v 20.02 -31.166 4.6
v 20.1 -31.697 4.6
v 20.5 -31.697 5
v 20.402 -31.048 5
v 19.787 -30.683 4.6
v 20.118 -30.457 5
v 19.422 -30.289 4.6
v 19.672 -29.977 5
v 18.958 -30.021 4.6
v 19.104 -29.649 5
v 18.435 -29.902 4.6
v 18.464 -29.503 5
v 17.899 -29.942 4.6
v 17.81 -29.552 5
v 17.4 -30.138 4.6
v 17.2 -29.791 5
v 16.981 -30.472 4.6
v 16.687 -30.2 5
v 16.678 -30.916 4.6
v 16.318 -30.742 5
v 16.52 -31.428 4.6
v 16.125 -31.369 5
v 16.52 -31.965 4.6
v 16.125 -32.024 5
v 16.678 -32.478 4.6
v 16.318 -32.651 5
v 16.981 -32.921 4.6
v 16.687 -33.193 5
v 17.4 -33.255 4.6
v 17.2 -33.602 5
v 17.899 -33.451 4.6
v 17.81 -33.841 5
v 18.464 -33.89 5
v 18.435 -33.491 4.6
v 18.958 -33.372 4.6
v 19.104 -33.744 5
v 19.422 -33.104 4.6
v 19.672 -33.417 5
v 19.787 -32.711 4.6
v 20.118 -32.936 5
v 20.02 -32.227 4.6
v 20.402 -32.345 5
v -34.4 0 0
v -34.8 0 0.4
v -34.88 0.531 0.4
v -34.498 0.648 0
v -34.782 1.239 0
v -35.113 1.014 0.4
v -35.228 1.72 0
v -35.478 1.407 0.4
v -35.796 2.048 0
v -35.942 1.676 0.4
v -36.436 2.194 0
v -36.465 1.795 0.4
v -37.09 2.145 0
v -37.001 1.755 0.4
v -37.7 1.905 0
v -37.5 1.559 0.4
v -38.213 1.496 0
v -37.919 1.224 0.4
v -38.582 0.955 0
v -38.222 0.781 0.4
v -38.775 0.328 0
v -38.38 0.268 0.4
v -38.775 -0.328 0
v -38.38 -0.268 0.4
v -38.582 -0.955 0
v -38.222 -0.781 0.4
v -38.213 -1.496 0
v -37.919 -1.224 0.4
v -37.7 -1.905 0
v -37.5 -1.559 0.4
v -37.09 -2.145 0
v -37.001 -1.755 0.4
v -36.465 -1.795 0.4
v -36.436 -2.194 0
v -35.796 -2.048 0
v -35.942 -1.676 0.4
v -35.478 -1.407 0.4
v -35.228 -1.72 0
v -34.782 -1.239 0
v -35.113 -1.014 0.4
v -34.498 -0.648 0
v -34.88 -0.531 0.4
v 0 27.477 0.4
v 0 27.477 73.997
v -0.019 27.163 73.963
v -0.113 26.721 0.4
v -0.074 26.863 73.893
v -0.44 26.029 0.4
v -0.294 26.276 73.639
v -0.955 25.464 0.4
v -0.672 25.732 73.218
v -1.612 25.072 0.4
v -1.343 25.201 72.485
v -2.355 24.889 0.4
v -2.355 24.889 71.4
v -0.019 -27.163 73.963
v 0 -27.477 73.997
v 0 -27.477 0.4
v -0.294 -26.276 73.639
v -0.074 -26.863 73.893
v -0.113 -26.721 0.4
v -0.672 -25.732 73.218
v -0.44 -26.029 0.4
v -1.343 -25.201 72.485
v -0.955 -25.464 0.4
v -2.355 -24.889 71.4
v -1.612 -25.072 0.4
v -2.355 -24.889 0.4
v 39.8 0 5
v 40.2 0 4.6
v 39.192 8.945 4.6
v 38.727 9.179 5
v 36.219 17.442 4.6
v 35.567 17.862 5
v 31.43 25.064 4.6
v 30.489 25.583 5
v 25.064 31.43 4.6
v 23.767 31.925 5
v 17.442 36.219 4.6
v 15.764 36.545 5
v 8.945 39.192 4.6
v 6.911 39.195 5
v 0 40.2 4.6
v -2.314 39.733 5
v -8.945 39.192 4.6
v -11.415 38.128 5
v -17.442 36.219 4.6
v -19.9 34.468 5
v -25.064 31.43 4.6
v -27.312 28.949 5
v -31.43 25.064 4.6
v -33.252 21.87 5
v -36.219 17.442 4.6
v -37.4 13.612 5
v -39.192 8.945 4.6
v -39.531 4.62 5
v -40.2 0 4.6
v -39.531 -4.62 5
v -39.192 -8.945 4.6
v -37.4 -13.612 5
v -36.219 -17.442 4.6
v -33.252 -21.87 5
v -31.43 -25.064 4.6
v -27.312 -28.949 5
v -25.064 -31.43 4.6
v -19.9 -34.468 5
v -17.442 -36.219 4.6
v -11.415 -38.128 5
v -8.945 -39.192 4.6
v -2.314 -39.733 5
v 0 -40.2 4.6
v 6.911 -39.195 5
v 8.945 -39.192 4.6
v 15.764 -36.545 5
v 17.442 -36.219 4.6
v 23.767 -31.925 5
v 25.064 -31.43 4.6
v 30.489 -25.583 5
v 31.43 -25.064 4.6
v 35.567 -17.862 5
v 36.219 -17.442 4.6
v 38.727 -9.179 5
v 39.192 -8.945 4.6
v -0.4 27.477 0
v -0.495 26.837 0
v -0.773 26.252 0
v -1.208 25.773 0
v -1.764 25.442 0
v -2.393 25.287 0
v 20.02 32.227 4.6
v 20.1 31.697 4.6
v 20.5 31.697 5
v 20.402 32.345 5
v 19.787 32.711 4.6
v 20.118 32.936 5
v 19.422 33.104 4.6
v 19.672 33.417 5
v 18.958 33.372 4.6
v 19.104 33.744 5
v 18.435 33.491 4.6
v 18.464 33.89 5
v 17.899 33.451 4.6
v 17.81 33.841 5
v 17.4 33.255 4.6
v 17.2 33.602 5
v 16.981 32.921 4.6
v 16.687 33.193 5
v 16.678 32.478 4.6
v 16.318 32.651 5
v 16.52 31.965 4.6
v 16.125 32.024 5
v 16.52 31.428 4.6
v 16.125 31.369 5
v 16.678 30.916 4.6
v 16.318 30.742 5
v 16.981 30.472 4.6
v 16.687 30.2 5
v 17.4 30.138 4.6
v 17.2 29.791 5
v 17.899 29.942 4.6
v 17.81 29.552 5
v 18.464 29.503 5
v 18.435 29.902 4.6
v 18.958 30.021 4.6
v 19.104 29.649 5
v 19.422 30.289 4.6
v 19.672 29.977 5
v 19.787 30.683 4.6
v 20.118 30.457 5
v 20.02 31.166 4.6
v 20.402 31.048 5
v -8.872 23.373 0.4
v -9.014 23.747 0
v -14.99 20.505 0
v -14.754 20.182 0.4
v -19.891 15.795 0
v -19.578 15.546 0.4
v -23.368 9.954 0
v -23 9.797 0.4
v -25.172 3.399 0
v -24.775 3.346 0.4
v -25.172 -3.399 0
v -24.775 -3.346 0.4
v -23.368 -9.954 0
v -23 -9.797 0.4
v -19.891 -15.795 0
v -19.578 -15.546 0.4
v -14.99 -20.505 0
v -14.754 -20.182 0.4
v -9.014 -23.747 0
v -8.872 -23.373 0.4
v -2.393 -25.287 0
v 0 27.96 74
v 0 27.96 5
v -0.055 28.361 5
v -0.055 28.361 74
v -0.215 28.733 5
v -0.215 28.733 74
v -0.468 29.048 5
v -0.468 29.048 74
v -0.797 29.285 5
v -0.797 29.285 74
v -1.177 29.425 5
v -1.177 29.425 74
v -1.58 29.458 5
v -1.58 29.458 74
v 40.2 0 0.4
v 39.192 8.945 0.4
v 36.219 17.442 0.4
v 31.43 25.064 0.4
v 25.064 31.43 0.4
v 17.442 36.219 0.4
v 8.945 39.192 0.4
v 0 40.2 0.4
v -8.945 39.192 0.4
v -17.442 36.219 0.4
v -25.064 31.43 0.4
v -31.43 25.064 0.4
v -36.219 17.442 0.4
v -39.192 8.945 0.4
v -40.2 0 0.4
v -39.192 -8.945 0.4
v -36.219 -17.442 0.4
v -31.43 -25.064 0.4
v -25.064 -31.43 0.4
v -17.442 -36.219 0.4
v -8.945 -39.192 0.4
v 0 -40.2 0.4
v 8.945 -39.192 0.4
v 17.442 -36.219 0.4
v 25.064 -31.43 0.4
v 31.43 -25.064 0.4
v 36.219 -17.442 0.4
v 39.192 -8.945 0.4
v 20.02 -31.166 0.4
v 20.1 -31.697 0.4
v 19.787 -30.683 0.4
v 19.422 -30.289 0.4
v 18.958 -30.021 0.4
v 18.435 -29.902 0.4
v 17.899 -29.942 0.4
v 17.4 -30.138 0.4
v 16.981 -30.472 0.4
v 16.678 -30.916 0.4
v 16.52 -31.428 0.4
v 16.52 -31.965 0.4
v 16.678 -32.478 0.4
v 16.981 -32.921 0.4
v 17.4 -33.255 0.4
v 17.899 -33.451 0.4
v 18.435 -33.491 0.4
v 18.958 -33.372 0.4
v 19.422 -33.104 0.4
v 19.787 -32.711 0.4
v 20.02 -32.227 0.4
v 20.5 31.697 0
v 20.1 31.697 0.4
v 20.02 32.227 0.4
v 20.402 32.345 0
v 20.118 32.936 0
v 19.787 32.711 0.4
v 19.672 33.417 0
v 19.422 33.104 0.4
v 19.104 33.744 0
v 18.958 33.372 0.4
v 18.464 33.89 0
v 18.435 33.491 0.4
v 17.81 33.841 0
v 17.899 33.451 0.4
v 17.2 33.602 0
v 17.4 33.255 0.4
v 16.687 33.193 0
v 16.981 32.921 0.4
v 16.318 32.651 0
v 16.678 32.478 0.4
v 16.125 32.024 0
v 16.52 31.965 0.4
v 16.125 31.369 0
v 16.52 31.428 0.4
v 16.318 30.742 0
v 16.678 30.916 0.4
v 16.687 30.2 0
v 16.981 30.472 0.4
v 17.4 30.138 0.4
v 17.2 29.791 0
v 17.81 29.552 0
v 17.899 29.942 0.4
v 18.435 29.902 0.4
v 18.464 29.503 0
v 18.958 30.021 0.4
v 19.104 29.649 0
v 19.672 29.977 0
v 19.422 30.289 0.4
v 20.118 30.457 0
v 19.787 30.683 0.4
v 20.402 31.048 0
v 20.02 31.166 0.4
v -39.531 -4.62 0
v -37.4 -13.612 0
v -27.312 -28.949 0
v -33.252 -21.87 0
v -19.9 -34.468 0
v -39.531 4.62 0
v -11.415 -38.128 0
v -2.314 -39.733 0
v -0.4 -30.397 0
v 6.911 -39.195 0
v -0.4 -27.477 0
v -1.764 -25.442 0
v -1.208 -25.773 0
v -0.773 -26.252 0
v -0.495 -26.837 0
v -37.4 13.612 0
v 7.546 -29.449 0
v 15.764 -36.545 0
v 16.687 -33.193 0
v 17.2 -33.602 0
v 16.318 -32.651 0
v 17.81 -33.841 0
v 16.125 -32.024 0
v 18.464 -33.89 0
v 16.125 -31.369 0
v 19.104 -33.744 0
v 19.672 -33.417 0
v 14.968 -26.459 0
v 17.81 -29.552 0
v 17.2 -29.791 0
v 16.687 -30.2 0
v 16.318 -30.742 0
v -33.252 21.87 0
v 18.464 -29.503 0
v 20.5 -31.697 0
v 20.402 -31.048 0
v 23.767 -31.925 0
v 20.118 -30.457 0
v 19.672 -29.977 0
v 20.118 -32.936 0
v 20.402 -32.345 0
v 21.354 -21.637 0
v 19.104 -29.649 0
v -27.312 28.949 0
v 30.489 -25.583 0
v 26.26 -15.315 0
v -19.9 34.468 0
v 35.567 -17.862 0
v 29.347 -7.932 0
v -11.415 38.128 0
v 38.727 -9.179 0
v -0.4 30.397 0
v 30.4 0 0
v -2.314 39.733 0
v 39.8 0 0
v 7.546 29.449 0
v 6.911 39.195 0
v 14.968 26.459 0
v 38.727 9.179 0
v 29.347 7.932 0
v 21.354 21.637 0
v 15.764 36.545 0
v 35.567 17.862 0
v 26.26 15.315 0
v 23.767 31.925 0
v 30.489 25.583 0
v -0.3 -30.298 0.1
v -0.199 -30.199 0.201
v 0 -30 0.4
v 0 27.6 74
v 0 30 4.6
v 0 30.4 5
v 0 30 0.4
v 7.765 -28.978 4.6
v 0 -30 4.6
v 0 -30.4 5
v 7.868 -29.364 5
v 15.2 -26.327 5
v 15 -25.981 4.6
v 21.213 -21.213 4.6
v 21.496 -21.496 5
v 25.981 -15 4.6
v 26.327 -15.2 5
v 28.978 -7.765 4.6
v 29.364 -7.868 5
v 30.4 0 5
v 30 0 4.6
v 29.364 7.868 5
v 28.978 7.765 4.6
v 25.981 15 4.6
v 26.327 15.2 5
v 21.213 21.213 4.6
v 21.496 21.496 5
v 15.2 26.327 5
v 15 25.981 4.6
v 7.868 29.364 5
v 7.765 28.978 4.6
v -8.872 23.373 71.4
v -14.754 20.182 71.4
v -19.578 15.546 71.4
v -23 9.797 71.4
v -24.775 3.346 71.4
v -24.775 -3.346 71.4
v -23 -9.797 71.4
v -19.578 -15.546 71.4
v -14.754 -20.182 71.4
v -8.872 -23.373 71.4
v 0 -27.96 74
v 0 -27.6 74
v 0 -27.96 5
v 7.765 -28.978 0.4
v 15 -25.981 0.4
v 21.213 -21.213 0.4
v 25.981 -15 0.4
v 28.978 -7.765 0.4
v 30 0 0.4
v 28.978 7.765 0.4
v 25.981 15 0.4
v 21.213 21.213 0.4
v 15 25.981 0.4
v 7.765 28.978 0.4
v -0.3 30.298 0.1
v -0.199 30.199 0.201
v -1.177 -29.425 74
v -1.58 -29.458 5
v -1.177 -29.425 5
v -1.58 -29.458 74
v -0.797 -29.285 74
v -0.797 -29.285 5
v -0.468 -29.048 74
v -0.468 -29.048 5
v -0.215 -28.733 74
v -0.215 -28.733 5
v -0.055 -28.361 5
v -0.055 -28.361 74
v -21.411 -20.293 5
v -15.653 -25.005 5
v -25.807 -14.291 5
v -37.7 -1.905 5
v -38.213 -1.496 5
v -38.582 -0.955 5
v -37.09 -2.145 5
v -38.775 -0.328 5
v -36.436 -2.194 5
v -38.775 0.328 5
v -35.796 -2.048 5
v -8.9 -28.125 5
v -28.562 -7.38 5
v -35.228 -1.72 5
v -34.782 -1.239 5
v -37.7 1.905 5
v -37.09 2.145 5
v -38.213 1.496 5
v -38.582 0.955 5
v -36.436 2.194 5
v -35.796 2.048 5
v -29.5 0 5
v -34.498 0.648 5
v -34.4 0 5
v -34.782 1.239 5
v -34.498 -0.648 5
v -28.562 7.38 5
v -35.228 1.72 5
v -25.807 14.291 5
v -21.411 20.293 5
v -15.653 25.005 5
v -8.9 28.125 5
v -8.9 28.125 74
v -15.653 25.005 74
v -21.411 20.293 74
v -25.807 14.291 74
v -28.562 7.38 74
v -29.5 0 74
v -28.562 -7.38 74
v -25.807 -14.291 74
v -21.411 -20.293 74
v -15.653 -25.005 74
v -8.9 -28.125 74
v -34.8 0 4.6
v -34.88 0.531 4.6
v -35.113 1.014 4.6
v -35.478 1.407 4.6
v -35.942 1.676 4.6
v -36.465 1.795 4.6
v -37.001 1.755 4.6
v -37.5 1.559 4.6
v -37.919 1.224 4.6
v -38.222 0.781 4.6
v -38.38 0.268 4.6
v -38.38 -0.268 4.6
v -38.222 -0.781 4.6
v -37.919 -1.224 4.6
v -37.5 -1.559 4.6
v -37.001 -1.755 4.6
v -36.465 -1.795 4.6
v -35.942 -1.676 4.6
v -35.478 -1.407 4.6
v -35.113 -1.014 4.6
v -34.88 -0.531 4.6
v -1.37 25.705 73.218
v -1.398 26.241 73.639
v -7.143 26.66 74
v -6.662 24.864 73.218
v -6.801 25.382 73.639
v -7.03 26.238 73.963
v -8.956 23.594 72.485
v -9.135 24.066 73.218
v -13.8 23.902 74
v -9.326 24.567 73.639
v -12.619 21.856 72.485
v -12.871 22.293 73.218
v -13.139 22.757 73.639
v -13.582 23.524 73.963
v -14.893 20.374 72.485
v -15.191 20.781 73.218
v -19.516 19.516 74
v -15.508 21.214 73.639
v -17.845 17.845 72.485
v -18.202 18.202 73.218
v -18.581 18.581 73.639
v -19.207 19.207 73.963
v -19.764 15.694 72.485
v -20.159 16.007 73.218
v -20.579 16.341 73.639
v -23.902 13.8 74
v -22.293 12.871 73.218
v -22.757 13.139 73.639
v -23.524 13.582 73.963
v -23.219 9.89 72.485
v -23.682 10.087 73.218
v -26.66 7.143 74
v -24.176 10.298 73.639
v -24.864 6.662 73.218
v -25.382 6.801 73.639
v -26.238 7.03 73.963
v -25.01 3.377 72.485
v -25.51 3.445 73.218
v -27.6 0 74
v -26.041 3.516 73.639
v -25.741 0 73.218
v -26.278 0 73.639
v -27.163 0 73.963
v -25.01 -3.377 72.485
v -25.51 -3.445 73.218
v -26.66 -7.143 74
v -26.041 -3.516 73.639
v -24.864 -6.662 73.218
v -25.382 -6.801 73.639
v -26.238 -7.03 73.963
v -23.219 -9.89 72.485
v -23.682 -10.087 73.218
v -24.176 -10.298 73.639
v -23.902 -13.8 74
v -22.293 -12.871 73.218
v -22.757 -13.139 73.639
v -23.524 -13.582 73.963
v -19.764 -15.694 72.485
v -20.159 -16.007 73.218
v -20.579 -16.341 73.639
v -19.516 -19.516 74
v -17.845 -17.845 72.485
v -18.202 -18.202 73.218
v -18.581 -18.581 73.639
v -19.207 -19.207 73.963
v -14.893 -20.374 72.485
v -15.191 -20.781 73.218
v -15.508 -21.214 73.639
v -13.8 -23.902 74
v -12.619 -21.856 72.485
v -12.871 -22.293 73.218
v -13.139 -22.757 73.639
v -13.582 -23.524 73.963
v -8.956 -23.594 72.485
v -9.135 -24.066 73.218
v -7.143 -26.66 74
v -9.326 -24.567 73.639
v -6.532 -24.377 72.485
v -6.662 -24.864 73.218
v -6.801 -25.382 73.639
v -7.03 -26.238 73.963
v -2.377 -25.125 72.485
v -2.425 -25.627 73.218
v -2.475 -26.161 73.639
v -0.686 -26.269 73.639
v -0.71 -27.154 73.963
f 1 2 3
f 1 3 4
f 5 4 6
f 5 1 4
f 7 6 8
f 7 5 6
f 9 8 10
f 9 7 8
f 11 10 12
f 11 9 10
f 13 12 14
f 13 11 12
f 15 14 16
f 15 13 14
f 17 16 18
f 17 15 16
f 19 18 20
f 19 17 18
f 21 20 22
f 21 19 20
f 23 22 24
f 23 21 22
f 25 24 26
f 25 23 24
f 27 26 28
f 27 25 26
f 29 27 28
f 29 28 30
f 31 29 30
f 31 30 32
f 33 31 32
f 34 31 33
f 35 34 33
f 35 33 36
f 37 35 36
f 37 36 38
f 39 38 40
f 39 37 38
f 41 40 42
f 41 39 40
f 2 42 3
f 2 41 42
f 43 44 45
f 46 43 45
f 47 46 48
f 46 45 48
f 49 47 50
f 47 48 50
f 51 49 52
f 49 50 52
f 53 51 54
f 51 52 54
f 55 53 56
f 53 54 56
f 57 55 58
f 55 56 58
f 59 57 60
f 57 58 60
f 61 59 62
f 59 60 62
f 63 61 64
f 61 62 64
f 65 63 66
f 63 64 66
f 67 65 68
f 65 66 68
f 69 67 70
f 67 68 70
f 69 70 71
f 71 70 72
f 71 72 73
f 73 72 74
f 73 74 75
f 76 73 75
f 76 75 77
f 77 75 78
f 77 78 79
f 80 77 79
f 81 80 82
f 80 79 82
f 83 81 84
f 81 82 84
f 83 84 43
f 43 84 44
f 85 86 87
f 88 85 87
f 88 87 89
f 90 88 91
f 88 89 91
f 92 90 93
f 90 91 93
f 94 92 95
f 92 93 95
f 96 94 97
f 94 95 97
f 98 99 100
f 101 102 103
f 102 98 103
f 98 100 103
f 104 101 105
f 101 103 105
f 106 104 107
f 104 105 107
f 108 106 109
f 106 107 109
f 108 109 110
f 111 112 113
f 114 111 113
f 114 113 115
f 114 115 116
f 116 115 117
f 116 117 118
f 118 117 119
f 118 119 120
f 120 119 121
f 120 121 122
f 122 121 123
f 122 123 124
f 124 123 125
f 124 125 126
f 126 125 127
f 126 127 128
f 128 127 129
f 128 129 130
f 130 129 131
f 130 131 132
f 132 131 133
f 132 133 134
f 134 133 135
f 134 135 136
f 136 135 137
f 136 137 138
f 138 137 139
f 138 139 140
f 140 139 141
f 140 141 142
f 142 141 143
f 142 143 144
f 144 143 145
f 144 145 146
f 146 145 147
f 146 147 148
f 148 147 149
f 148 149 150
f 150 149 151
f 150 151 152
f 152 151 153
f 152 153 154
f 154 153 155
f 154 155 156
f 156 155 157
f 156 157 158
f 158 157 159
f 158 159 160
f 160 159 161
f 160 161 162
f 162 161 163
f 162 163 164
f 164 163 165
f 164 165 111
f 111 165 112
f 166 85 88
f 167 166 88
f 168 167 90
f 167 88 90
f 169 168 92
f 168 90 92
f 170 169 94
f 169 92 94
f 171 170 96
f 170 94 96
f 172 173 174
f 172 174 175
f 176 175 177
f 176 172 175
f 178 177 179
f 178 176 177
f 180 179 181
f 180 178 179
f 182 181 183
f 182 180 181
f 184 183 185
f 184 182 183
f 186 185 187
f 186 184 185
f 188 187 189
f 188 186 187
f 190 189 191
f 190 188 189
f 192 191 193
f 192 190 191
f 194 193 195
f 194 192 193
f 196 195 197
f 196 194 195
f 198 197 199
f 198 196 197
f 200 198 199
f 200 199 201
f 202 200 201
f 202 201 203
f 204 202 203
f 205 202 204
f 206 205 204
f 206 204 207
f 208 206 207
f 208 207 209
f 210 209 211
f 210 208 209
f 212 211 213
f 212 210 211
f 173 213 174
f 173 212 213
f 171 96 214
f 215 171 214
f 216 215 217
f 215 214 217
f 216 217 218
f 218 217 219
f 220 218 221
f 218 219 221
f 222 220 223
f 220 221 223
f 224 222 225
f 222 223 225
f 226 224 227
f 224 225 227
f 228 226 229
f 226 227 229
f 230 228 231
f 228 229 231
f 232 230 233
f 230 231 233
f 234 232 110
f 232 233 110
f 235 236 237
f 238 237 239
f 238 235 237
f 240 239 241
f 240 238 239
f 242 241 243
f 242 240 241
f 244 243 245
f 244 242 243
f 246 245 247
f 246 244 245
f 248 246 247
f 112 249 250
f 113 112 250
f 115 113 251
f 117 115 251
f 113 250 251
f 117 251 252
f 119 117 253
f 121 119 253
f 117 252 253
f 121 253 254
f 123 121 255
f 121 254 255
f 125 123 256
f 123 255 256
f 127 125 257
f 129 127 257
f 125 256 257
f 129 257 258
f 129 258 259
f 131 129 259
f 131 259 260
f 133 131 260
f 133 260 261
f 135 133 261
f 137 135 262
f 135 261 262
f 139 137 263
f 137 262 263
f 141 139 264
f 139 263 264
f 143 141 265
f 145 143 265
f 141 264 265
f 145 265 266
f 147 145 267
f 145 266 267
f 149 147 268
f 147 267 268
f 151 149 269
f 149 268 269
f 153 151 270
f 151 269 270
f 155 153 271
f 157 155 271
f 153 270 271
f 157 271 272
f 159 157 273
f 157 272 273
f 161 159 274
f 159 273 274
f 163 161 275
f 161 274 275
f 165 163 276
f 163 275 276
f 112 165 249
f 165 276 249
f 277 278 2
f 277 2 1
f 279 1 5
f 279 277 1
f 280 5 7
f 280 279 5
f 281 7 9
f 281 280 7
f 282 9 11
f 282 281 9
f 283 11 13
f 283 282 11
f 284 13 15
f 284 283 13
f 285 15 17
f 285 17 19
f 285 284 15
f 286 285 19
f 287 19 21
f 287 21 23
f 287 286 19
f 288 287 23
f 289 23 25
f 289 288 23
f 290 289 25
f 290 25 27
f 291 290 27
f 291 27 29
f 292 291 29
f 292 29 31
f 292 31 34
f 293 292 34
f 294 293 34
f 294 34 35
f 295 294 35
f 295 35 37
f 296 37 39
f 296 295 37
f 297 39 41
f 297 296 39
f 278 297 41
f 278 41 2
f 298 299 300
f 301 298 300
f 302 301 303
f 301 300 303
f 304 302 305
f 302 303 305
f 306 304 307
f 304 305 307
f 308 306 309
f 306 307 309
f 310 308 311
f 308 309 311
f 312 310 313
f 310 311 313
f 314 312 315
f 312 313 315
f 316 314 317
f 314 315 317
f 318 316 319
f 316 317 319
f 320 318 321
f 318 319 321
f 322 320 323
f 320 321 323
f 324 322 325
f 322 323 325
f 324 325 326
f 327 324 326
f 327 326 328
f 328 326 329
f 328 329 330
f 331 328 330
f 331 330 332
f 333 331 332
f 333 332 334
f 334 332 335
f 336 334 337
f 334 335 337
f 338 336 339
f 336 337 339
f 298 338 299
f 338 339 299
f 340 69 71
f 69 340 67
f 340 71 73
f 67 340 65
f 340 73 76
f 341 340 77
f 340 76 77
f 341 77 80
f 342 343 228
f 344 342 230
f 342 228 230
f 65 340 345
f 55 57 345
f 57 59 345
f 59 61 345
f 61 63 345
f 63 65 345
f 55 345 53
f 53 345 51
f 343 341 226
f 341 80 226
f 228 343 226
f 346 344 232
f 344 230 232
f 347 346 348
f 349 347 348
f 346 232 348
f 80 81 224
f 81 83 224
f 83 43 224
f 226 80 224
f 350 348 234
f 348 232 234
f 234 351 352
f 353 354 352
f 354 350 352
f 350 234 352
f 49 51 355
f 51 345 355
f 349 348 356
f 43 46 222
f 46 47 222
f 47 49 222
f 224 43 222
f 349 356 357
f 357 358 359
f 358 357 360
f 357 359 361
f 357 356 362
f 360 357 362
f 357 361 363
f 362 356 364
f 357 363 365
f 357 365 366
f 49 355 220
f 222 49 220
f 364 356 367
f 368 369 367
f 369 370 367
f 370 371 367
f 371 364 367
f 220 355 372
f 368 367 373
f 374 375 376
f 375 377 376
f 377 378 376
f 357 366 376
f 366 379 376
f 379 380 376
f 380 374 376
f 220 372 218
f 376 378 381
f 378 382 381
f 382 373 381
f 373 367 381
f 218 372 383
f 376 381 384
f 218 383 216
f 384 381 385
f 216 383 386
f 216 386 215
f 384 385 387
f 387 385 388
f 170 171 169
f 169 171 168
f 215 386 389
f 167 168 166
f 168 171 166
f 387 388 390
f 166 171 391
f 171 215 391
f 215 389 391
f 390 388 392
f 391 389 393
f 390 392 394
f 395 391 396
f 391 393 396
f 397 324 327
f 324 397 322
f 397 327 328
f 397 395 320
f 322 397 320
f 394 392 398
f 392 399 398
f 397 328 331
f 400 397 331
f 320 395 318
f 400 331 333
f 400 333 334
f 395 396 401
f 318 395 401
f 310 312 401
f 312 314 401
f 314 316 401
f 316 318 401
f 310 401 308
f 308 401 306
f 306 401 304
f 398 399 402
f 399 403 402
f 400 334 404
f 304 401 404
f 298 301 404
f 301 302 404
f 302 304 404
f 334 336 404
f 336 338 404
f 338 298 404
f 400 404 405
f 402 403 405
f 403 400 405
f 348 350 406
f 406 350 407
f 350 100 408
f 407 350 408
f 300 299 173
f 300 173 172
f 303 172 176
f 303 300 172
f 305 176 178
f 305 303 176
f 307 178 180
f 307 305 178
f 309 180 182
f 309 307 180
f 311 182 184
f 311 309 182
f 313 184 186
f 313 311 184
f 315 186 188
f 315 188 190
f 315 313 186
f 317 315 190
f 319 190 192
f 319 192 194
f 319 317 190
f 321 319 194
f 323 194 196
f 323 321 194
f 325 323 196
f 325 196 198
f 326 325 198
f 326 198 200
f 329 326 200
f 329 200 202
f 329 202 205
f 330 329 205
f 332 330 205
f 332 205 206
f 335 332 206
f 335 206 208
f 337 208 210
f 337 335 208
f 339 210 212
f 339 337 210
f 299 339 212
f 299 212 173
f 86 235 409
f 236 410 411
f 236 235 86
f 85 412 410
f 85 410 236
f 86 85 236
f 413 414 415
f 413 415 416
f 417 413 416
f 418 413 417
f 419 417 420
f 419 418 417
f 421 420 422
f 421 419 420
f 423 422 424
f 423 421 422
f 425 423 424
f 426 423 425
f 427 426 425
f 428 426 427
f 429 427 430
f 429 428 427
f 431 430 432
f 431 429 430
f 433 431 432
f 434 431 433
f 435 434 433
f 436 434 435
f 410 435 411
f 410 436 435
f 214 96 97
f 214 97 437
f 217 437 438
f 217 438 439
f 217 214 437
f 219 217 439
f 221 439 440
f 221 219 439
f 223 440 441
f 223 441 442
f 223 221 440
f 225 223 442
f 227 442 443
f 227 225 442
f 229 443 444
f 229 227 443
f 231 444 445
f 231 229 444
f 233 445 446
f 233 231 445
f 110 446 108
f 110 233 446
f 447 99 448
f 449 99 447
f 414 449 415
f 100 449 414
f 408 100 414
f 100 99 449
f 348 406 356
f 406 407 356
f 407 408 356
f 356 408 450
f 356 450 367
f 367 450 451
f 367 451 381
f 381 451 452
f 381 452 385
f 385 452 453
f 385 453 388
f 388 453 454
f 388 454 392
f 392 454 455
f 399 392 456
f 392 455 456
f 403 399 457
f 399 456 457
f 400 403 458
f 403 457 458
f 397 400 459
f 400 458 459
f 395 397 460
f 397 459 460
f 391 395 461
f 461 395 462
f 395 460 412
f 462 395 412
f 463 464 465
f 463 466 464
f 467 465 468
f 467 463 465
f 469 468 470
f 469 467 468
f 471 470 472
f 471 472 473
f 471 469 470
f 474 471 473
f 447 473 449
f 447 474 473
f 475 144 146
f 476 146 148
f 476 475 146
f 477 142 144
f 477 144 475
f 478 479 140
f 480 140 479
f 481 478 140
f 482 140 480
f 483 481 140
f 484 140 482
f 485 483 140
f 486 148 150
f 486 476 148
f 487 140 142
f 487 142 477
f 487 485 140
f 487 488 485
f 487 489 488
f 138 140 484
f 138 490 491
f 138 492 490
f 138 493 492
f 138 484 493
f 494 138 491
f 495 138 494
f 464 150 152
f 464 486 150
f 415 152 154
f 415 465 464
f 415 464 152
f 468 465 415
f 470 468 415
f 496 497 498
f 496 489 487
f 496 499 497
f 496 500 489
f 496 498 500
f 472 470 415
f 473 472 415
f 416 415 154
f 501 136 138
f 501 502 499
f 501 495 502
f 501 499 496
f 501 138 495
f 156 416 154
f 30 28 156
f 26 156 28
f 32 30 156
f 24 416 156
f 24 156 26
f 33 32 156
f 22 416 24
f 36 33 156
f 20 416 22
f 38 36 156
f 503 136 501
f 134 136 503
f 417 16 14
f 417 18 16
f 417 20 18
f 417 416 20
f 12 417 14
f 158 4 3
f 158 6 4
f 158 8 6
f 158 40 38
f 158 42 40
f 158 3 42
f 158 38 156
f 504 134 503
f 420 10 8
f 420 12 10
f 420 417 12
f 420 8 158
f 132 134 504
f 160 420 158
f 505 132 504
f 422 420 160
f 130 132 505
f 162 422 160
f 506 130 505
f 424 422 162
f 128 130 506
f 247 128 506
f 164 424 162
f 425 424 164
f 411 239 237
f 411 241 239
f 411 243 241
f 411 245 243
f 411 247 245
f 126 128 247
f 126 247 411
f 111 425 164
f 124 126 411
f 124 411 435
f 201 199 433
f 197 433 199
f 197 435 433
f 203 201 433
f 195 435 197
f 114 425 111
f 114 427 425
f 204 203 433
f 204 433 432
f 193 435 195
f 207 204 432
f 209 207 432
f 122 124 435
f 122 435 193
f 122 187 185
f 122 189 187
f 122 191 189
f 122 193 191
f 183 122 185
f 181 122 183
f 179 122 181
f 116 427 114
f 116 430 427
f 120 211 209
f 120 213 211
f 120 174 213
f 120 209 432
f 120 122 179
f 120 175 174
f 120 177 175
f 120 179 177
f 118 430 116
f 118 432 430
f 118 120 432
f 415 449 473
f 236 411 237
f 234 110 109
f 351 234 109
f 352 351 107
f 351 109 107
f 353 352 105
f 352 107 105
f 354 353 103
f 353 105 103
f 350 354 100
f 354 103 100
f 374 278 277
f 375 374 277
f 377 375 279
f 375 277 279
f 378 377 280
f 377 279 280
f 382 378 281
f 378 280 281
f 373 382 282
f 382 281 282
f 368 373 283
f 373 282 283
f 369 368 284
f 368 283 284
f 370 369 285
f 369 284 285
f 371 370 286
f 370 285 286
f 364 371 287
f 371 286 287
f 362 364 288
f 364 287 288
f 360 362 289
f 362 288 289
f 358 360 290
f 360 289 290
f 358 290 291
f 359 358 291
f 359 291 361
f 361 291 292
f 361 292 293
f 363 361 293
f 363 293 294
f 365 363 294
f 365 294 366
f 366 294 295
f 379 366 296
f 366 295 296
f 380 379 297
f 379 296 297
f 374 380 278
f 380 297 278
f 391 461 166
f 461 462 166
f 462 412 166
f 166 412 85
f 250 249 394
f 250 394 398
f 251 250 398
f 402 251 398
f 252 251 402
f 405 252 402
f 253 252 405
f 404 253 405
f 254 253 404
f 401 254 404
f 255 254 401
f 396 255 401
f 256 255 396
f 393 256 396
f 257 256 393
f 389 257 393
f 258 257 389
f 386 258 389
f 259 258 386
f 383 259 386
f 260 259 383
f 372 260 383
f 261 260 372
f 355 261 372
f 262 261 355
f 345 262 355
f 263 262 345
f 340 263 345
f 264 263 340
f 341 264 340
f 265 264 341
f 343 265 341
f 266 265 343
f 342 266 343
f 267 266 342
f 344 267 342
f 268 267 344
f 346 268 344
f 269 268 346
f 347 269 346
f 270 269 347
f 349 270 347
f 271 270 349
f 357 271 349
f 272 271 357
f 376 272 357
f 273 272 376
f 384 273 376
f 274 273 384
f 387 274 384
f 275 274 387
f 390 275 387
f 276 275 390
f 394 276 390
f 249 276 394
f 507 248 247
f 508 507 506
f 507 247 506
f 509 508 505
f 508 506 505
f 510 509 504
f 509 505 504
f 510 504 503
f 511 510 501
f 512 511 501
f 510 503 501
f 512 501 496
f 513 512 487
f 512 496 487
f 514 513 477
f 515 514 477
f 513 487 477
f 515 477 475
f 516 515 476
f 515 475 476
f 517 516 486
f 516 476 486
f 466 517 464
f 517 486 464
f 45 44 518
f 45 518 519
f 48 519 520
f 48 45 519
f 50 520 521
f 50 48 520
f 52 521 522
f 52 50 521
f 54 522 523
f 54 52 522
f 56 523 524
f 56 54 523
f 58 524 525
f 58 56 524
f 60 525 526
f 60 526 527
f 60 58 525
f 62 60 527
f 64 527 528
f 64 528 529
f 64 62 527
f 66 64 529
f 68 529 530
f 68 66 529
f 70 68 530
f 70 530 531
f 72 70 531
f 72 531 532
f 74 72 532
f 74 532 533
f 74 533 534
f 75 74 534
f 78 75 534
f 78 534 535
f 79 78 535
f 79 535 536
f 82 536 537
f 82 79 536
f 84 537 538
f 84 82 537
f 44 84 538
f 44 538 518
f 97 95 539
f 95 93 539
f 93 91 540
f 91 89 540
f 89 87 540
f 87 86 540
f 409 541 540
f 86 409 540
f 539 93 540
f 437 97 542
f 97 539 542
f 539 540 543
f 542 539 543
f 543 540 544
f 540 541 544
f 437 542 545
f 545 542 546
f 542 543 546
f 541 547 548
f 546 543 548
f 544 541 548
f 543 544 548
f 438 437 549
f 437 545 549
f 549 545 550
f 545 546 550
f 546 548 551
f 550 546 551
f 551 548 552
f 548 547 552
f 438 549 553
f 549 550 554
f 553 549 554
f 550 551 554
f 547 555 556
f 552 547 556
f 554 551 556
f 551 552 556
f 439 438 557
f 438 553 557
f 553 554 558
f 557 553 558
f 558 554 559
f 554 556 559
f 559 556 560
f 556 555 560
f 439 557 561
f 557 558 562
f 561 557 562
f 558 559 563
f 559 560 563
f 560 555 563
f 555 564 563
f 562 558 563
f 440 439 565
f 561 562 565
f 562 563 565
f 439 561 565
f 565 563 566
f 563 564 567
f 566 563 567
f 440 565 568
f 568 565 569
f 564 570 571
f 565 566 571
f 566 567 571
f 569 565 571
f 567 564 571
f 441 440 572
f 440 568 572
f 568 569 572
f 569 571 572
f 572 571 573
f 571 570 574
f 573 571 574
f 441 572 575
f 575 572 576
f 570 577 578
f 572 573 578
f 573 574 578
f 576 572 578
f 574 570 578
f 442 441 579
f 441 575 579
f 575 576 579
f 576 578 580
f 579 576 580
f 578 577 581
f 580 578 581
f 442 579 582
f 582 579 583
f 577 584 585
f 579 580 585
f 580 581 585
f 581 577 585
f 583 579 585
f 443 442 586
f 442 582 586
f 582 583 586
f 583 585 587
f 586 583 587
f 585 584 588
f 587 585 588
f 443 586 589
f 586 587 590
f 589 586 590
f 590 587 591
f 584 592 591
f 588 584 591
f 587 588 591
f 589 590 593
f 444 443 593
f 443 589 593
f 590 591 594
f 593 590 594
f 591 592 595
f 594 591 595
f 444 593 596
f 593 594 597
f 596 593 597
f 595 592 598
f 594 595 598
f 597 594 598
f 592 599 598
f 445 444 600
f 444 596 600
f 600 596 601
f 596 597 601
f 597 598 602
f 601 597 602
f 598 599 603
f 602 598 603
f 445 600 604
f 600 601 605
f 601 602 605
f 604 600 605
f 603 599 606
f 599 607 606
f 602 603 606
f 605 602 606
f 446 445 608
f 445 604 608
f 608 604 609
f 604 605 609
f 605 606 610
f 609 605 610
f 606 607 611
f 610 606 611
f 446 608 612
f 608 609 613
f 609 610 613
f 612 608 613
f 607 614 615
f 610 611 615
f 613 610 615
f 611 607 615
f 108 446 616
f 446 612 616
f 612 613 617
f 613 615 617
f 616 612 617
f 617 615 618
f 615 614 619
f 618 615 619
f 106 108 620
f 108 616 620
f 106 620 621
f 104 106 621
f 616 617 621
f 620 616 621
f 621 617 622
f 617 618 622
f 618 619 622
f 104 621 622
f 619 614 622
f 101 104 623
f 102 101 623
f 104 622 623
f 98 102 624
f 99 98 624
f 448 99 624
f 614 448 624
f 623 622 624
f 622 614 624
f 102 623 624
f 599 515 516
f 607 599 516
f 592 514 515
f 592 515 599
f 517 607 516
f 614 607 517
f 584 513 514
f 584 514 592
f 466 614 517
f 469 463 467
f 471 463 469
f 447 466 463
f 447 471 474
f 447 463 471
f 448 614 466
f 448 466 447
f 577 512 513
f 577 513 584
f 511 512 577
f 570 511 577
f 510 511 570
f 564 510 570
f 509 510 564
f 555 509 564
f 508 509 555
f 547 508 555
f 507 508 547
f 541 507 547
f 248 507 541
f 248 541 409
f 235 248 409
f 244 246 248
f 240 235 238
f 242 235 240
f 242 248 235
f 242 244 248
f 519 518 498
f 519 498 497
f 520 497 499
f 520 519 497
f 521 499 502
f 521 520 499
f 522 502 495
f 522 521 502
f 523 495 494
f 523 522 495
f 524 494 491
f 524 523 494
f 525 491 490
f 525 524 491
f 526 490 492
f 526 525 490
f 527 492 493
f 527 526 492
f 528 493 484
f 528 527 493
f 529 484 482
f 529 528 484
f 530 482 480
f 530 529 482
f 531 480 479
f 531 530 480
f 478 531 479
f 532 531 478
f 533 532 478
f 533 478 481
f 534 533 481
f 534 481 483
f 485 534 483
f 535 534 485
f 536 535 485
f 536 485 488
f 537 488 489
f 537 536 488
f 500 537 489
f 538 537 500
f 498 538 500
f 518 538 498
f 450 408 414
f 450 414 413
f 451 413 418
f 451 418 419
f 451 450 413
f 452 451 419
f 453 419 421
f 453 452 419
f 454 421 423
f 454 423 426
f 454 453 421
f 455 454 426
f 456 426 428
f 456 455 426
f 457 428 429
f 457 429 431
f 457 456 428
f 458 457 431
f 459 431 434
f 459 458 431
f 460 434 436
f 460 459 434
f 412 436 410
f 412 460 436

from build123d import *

# Parameters (mm, degrees)
SKETCH_R     = 40.2
SKETCH_R_2   = 25
PAD_DEPTH    = 5
PAD001_DEPTH = 74
POCKET_DEPTH = 5
FILLET_R     = 1.5
FILLET001_R  = 2.6
SKETCH003_R  = 1.8
HOLE_DEPTH   = 5
CHAMFER_SIZE = 0.4


with BuildPart() as part:
    # Sketch → Pad (new body)
    with BuildSketch(Plane.XY):
        Circle(SKETCH_R)
        Circle(SKETCH_R_2, mode=Mode.SUBTRACT)
    extrude(amount=PAD_DEPTH)

    # Sketch001 → Pad001 (join)
    with BuildSketch(Plane.XY):
        with BuildLine():
            ThreePointArc((0, 29.5), (-29.5, 0), (0, -29.5))
            Line((0, -25), (0, -29.5))
            ThreePointArc((0, 25), (-25, 0), (0, -25))
            Line((0, 29.5), (0, 25))
        make_face()
    extrude(amount=PAD001_DEPTH)

    # Sketch002 → Pocket (cut)
    with BuildSketch(Plane.XY):
        with BuildLine():
            ThreePointArc((0, -30), (30, 0), (0, 30))
            Line((0, 30), (0, 25))
            ThreePointArc((0, -25), (25, 0), (0, 25))
            Line((0, -25), (0, -30))
        make_face()
    extrude(amount=POCKET_DEPTH, mode=Mode.SUBTRACT)

    # Fillet
    fillet_edges = [part.edges().sort_by_distance(p)[0] for p in [
        (0, -29.5, 39.5),
        (0, 29.5, 39.5),
    ]]
    fillet(fillet_edges, radius=FILLET_R)

    # Fillet001
    fillet001_edges = [part.edges().sort_by_distance(p)[0] for p in [
        (-25, 0, 74),
        (0, -25, 39.5),
        (0, 25, 39.5),
    ]]
    fillet(fillet001_edges, radius=FILLET001_R)

    # Sketch003 → Hole (cut)
    with BuildSketch(Plane.XY):
        with Locations((-36.6, 0)):
            Circle(SKETCH003_R)
        with Locations((18.3, 31.69653)):
            Circle(SKETCH003_R)
        with Locations((18.3, -31.69653)):
            Circle(SKETCH003_R)
    extrude(amount=HOLE_DEPTH, mode=Mode.SUBTRACT)

    # Chamfer
    chamfer_edges = [part.edges().sort_by_distance(p)[0] for p in [
        (-40.2, 0, 0),
        (20.1, -31.69653, 0),
        (-34.8, 0, 0),
        (20.1, 31.69653, 0),
        (30, 0, 0),
        (0, -29.75, 0),
        (0, -28.488632, 0),
        (-0.676876, -25.727522, 0),
        (-25, 0, 0),
        (0, 29.75, 0),
        (0, 28.488632, 0),
        (-0.676876, 25.727522, 0),
        (-40.2, 0, 5),
        (-34.8, 0, 5),
        (20.1, 31.69653, 5),
        (20.1, -31.69653, 5),
        (30, 0, 5),
    ]]
    chamfer(chamfer_edges, length=CHAMFER_SIZE)


solid = part.part
